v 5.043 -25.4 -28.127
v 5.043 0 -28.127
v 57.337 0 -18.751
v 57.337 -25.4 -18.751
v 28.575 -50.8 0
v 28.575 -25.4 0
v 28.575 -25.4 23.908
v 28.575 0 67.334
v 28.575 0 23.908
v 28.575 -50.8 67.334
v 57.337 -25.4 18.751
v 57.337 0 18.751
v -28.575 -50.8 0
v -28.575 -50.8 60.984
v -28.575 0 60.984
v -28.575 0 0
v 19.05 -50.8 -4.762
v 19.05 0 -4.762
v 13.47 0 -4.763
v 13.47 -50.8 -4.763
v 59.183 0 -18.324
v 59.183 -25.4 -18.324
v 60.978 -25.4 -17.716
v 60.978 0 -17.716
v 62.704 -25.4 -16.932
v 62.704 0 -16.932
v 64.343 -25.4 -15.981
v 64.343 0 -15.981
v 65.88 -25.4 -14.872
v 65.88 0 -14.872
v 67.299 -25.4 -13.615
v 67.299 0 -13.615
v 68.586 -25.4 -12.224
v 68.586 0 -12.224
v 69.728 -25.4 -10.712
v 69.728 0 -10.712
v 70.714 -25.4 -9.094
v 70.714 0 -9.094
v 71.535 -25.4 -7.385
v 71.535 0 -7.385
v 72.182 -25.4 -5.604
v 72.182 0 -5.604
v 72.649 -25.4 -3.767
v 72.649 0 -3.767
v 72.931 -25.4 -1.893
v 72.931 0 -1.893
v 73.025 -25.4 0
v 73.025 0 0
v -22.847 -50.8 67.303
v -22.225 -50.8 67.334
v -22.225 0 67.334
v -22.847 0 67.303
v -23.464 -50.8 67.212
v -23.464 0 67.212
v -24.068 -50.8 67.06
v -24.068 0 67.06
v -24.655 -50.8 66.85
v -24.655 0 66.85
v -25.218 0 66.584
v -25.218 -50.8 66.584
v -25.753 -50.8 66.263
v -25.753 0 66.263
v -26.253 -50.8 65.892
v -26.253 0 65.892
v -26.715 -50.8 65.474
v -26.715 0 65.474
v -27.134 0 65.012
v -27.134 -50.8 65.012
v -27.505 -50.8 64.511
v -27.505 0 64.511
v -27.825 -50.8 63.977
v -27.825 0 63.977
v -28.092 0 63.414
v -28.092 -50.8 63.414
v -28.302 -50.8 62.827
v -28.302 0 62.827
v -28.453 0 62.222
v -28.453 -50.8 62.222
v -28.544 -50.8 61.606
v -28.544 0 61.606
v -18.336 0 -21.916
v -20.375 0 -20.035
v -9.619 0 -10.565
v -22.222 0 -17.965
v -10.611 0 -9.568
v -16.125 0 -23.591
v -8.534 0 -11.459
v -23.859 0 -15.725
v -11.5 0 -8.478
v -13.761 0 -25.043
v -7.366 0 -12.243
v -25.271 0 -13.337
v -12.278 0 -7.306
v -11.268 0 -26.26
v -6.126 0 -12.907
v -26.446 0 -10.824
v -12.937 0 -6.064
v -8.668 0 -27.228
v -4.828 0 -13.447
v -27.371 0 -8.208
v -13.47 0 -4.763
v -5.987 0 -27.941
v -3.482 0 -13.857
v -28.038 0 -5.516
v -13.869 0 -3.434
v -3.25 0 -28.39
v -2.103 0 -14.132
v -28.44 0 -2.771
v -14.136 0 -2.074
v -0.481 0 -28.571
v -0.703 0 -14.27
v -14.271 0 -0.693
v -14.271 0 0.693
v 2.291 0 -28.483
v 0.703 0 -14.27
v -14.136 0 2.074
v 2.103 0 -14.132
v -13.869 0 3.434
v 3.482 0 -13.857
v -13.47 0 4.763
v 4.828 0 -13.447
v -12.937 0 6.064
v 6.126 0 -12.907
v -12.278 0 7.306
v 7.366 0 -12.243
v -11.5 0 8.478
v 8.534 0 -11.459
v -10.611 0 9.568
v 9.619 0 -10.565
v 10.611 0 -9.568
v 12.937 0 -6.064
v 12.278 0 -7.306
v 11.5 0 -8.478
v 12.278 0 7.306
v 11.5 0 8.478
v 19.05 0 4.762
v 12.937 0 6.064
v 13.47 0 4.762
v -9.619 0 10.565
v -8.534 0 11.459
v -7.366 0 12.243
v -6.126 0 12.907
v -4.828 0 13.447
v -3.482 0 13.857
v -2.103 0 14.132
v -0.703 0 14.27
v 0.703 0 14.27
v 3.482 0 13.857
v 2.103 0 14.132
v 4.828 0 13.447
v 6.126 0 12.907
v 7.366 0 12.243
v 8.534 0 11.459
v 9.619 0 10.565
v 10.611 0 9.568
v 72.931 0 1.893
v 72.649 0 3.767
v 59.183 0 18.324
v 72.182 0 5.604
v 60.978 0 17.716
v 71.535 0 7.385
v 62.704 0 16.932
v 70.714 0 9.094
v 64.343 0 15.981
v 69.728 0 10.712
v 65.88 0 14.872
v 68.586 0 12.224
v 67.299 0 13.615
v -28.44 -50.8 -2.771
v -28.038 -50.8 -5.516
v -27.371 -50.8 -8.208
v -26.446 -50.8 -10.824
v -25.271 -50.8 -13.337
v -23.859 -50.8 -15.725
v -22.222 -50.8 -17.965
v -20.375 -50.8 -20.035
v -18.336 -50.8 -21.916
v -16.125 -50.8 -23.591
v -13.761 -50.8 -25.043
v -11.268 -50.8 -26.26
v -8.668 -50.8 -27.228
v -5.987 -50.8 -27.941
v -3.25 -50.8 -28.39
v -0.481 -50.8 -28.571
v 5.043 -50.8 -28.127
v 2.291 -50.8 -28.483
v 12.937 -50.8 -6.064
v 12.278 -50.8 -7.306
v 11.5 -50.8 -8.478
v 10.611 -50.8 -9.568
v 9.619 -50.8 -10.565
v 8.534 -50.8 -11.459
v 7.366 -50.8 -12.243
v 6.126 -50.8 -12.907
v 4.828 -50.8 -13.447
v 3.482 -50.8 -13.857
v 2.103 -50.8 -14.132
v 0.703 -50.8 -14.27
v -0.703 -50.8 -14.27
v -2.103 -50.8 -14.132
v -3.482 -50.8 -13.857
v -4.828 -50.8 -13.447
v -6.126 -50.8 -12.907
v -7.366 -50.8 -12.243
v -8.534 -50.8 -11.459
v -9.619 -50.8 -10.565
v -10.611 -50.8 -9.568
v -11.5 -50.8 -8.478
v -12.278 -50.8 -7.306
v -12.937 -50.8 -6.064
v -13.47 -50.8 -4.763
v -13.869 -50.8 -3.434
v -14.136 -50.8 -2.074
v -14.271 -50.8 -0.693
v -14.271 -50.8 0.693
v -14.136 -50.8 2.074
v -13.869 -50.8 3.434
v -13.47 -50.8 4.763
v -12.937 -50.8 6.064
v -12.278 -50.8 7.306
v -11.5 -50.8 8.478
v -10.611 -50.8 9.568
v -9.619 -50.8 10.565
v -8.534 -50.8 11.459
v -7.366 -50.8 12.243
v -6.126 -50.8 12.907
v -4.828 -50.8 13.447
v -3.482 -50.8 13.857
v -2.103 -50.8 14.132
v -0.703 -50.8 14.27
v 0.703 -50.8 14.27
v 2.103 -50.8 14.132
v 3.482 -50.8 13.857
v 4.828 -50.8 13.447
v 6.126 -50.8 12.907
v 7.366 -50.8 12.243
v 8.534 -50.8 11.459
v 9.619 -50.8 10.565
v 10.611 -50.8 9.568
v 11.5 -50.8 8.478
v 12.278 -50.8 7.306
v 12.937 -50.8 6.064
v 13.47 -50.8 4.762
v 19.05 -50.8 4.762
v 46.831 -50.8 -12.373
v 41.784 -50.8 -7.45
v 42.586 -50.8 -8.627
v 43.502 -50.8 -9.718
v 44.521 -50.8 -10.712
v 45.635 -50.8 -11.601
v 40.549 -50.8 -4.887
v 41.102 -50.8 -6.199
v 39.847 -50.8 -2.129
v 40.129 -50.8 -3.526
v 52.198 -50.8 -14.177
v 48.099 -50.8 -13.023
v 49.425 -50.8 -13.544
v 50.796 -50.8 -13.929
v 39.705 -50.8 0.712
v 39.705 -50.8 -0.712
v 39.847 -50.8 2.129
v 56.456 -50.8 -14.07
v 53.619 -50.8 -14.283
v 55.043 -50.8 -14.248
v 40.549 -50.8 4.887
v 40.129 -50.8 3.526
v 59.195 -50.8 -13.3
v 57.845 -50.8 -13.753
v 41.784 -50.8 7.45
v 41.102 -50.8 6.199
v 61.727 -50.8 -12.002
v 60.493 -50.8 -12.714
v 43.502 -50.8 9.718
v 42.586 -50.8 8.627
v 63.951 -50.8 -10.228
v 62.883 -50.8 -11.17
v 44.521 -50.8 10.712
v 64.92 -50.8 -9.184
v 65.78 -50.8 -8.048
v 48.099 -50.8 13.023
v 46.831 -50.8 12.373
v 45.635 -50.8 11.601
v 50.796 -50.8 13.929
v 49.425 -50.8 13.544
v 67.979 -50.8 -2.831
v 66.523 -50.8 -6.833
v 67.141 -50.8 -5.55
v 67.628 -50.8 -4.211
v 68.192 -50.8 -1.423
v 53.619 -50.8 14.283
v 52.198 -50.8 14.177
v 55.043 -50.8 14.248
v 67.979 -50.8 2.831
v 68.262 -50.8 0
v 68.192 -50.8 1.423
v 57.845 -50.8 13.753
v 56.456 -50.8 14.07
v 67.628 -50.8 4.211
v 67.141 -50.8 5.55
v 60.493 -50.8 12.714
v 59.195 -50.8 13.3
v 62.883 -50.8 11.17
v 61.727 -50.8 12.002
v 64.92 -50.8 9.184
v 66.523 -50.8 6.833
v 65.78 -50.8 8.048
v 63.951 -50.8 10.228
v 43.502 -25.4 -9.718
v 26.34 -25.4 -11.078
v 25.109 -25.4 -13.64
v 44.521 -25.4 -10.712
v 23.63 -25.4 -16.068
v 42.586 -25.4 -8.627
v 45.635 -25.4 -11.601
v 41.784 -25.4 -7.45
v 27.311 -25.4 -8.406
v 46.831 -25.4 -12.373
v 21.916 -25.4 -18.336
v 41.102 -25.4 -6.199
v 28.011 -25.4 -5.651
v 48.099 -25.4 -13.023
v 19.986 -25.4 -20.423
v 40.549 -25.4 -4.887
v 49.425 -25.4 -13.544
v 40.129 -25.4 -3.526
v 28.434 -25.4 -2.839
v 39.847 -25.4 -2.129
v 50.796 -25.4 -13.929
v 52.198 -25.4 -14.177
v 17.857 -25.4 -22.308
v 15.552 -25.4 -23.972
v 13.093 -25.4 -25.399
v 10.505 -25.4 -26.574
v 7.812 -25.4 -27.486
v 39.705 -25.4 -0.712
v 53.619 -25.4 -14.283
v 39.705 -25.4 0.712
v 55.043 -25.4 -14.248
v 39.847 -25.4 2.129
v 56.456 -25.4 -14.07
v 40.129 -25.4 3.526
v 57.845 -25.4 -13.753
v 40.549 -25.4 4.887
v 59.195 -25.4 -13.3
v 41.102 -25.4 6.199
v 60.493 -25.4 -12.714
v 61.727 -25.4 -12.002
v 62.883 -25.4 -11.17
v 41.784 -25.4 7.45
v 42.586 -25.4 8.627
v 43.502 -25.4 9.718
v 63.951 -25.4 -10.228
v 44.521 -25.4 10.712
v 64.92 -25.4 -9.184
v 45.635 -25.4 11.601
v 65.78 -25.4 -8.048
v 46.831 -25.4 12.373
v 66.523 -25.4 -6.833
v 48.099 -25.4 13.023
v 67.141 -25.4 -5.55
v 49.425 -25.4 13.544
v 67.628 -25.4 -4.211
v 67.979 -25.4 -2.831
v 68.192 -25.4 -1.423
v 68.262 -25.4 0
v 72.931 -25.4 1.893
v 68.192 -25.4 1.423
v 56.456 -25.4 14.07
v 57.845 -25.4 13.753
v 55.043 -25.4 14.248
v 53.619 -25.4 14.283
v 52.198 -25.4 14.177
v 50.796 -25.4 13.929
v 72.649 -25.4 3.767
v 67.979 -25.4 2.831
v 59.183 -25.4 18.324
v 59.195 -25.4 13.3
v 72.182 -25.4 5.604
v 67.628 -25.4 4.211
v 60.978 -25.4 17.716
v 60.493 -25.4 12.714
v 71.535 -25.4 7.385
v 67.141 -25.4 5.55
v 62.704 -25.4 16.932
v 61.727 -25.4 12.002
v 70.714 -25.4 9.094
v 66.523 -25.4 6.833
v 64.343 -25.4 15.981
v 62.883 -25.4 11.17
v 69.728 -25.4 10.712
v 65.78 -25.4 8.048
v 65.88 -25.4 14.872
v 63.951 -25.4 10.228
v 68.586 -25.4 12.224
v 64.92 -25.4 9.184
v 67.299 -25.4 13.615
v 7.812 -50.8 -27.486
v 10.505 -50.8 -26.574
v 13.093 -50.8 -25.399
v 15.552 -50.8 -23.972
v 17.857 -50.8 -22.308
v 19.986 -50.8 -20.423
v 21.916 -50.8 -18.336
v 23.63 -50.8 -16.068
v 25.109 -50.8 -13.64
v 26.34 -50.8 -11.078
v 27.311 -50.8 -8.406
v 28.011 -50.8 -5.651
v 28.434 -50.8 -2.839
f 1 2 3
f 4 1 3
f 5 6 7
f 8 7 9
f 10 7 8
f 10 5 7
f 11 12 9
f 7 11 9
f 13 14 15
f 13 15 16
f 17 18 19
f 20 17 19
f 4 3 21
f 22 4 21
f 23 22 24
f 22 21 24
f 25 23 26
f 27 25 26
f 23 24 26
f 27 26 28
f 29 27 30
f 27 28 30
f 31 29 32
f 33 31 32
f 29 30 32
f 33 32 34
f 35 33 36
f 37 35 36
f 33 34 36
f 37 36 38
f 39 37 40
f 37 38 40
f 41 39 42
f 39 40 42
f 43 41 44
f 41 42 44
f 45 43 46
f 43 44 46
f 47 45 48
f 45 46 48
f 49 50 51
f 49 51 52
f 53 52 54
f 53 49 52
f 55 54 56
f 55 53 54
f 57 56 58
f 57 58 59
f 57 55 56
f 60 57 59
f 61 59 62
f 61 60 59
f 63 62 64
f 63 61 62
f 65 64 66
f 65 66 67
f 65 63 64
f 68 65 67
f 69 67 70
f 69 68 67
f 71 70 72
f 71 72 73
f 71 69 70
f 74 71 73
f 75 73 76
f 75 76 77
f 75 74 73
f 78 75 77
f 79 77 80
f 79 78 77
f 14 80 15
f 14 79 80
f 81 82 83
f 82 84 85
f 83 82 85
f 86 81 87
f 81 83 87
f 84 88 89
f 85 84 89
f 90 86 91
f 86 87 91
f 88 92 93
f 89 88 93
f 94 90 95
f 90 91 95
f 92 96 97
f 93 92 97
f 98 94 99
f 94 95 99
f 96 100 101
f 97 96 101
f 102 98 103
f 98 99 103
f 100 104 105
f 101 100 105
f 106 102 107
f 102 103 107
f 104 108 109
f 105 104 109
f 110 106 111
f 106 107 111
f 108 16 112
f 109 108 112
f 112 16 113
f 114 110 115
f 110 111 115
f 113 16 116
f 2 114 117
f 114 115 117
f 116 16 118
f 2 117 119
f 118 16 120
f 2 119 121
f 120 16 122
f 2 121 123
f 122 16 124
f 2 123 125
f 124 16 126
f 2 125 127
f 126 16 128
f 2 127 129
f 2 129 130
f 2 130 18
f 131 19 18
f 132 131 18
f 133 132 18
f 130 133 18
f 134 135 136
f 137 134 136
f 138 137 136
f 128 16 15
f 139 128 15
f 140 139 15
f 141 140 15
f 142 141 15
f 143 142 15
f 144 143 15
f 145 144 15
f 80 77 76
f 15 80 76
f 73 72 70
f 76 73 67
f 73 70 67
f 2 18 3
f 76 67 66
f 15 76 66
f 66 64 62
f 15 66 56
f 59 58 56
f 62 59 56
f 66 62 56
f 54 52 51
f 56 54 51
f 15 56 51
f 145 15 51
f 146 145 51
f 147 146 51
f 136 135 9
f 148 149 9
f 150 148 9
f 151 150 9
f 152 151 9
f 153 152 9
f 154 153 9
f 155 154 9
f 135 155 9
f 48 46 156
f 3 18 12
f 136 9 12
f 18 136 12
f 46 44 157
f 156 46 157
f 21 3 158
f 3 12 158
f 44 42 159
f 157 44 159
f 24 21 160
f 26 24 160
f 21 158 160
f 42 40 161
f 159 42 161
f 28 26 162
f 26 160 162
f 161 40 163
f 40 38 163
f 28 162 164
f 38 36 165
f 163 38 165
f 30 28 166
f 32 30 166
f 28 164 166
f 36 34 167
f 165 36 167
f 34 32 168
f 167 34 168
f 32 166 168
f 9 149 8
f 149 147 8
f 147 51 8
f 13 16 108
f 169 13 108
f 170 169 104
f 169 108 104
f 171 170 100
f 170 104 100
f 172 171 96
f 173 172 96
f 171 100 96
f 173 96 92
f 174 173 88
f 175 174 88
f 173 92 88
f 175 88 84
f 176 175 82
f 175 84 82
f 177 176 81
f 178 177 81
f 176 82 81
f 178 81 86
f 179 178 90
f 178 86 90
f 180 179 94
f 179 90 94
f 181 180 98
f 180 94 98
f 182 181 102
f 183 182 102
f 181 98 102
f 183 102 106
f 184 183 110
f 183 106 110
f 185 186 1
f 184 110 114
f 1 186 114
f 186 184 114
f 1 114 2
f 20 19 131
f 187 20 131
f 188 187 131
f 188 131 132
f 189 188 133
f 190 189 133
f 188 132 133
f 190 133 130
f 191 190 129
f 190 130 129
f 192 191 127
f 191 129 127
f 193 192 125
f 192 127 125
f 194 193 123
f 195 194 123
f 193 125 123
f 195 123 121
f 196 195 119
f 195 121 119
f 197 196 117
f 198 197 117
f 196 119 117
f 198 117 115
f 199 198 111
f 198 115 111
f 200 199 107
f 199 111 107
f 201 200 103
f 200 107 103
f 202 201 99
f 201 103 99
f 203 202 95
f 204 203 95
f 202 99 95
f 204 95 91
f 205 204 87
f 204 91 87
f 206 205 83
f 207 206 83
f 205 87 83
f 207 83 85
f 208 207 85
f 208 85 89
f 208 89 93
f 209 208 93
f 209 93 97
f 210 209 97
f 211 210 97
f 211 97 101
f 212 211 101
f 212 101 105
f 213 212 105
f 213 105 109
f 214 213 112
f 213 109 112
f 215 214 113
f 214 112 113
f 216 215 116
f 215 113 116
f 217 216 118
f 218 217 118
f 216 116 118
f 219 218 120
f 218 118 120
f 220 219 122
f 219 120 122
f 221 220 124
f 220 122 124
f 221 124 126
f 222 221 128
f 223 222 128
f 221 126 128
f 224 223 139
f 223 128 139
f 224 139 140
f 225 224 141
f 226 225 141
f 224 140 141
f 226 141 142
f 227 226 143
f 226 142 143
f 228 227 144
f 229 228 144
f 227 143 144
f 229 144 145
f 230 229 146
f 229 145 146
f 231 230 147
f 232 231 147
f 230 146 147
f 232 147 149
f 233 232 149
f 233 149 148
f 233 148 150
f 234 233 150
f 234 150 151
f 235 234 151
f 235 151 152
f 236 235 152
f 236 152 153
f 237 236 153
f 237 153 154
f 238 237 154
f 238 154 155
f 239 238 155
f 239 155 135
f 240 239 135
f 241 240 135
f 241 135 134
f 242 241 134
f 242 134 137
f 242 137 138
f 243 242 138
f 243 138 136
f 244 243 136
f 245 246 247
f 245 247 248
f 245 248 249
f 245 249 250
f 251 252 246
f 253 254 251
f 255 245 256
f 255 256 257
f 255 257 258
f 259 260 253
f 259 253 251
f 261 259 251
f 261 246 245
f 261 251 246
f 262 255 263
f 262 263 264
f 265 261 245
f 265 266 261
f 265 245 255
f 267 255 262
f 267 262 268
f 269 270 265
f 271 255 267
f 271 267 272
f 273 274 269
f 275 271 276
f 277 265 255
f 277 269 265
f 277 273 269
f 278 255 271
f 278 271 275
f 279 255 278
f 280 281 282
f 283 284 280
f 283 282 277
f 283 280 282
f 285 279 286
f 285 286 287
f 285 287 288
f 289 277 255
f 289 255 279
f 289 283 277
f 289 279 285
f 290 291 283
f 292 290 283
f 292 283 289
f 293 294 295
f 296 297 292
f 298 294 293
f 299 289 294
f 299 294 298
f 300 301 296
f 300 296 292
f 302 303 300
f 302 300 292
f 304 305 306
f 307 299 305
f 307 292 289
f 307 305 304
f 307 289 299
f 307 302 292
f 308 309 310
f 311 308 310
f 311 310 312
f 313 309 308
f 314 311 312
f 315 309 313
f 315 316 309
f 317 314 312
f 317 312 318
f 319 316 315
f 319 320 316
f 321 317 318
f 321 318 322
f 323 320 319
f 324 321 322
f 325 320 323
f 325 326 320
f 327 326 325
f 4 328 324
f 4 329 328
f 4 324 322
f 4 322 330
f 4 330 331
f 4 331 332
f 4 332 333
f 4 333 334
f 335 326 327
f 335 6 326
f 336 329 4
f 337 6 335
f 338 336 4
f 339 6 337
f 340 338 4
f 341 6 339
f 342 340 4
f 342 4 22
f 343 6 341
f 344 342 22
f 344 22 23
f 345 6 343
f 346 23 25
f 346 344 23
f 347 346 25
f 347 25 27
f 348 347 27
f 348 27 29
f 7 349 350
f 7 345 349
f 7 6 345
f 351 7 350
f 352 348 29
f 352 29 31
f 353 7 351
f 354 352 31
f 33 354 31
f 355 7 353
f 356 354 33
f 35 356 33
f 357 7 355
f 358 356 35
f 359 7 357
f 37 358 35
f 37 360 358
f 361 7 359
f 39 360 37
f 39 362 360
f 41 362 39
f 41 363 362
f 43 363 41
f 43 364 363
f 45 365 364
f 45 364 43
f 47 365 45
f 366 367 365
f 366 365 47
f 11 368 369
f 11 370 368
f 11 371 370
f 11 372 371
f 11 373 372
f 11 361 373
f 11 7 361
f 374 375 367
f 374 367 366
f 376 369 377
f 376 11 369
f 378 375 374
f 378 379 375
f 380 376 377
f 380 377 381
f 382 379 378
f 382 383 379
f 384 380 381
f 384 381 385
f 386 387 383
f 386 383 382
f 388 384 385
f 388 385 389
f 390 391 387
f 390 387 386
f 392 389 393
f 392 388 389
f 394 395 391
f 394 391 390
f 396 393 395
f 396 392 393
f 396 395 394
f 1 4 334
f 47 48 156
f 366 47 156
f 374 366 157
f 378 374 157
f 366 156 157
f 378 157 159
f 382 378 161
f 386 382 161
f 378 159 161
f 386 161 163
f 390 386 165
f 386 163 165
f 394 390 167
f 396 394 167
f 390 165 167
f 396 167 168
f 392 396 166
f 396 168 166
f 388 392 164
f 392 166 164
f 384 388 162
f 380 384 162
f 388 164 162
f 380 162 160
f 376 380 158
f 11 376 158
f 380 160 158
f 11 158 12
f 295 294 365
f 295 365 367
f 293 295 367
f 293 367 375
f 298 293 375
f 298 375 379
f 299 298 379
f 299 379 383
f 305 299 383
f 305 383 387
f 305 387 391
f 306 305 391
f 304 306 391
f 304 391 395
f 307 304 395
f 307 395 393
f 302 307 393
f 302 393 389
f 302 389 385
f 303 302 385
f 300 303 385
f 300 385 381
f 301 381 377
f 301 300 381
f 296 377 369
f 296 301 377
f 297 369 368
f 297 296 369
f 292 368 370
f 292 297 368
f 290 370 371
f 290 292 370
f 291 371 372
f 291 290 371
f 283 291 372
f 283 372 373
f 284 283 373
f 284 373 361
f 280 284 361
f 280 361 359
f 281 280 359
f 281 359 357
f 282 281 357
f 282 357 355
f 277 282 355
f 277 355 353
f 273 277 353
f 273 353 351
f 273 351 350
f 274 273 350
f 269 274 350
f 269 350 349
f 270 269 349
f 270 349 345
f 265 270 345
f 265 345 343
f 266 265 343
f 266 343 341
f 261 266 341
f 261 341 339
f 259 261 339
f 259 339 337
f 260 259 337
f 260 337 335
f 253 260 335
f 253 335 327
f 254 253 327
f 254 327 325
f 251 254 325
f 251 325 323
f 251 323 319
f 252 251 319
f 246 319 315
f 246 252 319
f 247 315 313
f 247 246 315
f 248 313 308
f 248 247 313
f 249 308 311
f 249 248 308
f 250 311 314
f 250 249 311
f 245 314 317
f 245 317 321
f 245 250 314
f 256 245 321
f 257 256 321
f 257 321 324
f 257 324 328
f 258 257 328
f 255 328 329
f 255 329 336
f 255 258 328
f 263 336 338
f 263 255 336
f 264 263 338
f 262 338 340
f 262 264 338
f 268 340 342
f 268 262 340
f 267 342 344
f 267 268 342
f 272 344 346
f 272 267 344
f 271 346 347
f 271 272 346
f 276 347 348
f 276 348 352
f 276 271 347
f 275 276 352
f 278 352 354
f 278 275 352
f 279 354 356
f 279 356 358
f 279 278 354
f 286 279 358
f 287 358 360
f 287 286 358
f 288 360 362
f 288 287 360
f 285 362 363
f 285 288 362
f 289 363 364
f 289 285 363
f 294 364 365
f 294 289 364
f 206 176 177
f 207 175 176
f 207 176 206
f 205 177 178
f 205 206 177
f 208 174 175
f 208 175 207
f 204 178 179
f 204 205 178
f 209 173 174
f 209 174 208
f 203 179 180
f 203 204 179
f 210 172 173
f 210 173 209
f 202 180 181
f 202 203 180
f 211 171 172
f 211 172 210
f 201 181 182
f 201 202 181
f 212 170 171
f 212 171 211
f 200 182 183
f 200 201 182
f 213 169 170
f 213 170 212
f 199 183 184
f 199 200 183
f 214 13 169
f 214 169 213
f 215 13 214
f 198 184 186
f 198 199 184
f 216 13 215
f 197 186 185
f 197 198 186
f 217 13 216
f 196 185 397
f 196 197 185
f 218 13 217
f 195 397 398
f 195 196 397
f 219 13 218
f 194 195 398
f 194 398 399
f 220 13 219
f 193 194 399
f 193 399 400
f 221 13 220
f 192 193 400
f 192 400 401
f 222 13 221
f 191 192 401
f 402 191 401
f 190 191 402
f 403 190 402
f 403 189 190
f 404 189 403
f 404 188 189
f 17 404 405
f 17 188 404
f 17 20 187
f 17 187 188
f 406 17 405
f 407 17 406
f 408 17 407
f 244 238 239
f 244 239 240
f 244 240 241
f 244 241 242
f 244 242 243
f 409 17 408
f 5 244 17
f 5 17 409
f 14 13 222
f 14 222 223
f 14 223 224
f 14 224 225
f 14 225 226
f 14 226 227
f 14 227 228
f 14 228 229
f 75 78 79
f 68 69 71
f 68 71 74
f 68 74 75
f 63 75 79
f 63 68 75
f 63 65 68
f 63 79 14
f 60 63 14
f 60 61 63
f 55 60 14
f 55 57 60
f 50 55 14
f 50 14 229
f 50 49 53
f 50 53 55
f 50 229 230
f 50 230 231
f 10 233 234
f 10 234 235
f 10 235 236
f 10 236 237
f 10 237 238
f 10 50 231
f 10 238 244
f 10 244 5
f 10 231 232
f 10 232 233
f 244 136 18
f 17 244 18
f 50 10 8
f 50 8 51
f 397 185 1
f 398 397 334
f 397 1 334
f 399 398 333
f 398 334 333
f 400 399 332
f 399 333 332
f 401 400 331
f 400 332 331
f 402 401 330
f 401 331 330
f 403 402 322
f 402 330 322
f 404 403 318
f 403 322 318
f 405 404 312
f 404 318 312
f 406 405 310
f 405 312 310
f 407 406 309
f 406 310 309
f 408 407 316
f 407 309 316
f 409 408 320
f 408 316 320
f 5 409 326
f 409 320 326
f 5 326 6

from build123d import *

# Parameters (mm, degrees)
F0_R     = 14.2875
F1_DEPTH = 25.4
F2_DEPTH = 50.8
F3_R     = 14.2875
F4_DEPTH = 50.8


with BuildPart() as f1:
    # F0 (on Front) → F1 (new body)
    with BuildSketch(Plane.XZ):
        with BuildLine():
            ThreePointArc((5.0426470588, -28.1265414802), (21.9160245563, -18.3362616868), (28.575, 0))
            ThreePointArc((28.575, 0), (21.9160245563, 18.3362616868), (5.0426470588, 28.1265414802))
            ThreePointArc((5.0426470588, 28.1265414802), (-28.575, 0), (5.0426470588, -28.1265414802))
        make_face()
        with BuildLine():
            ThreePointArc((-13.4703841816, 4.7625), (0, 14.2875), (13.4703841816, 4.7625))
            Line((13.4703841816, 4.7625), (19.05, 4.7625))
            Line((19.05, 4.7625), (19.05, -4.7625))
            Line((19.05, -4.7625), (13.4703841816, -4.7625))
            ThreePointArc((13.4703841816, -4.7625), (0, -14.2875), (-13.4703841816, -4.7625))
            Line((-13.4703841816, -4.7625), (-19.05, -4.7625))
            Line((-19.05, -4.7625), (-19.05, 4.7625))
            Line((-19.05, 4.7625), (-13.4703841816, 4.7625))
        make_face(mode=Mode.SUBTRACT)
        with BuildLine():
            ThreePointArc((-13.4703841816, -4.7625), (-14.2875, 0), (-13.4703841816, 4.7625))
            Line((-13.4703841816, 4.7625), (-19.05, 4.7625))
            Line((-19.05, 4.7625), (-19.05, -4.7625))
            Line((-19.05, -4.7625), (-13.4703841816, -4.7625))
        make_face()
        with BuildLine():
            ThreePointArc((5.0426470588, 28.1265414802), (21.9160245563, 18.3362616868), (28.575, 0))
            ThreePointArc((28.575, 0), (21.9160245563, -18.3362616868), (5.0426470588, -28.1265414802))
            Line((5.0426470588, -28.1265414802), (57.3367647059, -18.7510276535))
            ThreePointArc((57.3367647059, -18.7510276535), (34.925, 0), (57.3367647059, 18.7510276535))
            Line((57.3367647059, 18.7510276535), (5.0426470588, 28.1265414802))
        make_face()
        with BuildLine():
            ThreePointArc((73.025, 0), (68.5856830375, 12.2241744579), (57.3367647059, 18.7510276535))
            ThreePointArc((57.3367647059, 18.7510276535), (34.925, 0), (57.3367647059, -18.7510276535))
            ThreePointArc((57.3367647059, -18.7510276535), (68.5856830375, -12.2241744579), (73.025, 0))
        make_face()
        with Locations((53.975, 0)):
            Circle(F0_R, mode=Mode.SUBTRACT)
    extrude(amount=F1_DEPTH)

    # F0 (on Front) → F2 (join)
    with BuildSketch(Plane.XZ):
        with BuildLine():
            ThreePointArc((5.0426470588, -28.1265414802), (21.9160245563, -18.3362616868), (28.575, 0))
            ThreePointArc((28.575, 0), (21.9160245563, 18.3362616868), (5.0426470588, 28.1265414802))
            ThreePointArc((5.0426470588, 28.1265414802), (-28.575, 0), (5.0426470588, -28.1265414802))
        make_face()
        with BuildLine():
            ThreePointArc((-13.4703841816, 4.7625), (0, 14.2875), (13.4703841816, 4.7625))
            Line((13.4703841816, 4.7625), (19.05, 4.7625))
            Line((19.05, 4.7625), (19.05, -4.7625))
            Line((19.05, -4.7625), (13.4703841816, -4.7625))
            ThreePointArc((13.4703841816, -4.7625), (0, -14.2875), (-13.4703841816, -4.7625))
            Line((-13.4703841816, -4.7625), (-19.05, -4.7625))
            Line((-19.05, -4.7625), (-19.05, 4.7625))
            Line((-19.05, 4.7625), (-13.4703841816, 4.7625))
        make_face(mode=Mode.SUBTRACT)
        with BuildLine():
            ThreePointArc((-13.4703841816, -4.7625), (-14.2875, 0), (-13.4703841816, 4.7625))
            Line((-13.4703841816, 4.7625), (-19.05, 4.7625))
            Line((-19.05, 4.7625), (-19.05, -4.7625))
            Line((-19.05, -4.7625), (-13.4703841816, -4.7625))
        make_face()
    extrude(amount=F2_DEPTH)

    # F3 (on face) → F4 (join, through all)
    with BuildSketch(Plane.XZ.offset(50.8)):
        with BuildLine():
            Line((-28.575, 60.9835536748), (-28.575, 0))
            ThreePointArc((-28.575, 0), (0, 28.575), (28.575, 0))
            Line((28.575, 0), (28.575, 67.3335536748))
            Line((28.575, 67.3335536748), (-22.225, 67.3335536748))
            ThreePointArc((-22.225, 67.3335536748), (-26.7151280605, 65.4736817353), (-28.575, 60.9835536748))
        make_face()
        with Locations((53.975, 0)):
            Circle(F3_R)
    extrude(amount=-F4_DEPTH)


solid = f1.part
